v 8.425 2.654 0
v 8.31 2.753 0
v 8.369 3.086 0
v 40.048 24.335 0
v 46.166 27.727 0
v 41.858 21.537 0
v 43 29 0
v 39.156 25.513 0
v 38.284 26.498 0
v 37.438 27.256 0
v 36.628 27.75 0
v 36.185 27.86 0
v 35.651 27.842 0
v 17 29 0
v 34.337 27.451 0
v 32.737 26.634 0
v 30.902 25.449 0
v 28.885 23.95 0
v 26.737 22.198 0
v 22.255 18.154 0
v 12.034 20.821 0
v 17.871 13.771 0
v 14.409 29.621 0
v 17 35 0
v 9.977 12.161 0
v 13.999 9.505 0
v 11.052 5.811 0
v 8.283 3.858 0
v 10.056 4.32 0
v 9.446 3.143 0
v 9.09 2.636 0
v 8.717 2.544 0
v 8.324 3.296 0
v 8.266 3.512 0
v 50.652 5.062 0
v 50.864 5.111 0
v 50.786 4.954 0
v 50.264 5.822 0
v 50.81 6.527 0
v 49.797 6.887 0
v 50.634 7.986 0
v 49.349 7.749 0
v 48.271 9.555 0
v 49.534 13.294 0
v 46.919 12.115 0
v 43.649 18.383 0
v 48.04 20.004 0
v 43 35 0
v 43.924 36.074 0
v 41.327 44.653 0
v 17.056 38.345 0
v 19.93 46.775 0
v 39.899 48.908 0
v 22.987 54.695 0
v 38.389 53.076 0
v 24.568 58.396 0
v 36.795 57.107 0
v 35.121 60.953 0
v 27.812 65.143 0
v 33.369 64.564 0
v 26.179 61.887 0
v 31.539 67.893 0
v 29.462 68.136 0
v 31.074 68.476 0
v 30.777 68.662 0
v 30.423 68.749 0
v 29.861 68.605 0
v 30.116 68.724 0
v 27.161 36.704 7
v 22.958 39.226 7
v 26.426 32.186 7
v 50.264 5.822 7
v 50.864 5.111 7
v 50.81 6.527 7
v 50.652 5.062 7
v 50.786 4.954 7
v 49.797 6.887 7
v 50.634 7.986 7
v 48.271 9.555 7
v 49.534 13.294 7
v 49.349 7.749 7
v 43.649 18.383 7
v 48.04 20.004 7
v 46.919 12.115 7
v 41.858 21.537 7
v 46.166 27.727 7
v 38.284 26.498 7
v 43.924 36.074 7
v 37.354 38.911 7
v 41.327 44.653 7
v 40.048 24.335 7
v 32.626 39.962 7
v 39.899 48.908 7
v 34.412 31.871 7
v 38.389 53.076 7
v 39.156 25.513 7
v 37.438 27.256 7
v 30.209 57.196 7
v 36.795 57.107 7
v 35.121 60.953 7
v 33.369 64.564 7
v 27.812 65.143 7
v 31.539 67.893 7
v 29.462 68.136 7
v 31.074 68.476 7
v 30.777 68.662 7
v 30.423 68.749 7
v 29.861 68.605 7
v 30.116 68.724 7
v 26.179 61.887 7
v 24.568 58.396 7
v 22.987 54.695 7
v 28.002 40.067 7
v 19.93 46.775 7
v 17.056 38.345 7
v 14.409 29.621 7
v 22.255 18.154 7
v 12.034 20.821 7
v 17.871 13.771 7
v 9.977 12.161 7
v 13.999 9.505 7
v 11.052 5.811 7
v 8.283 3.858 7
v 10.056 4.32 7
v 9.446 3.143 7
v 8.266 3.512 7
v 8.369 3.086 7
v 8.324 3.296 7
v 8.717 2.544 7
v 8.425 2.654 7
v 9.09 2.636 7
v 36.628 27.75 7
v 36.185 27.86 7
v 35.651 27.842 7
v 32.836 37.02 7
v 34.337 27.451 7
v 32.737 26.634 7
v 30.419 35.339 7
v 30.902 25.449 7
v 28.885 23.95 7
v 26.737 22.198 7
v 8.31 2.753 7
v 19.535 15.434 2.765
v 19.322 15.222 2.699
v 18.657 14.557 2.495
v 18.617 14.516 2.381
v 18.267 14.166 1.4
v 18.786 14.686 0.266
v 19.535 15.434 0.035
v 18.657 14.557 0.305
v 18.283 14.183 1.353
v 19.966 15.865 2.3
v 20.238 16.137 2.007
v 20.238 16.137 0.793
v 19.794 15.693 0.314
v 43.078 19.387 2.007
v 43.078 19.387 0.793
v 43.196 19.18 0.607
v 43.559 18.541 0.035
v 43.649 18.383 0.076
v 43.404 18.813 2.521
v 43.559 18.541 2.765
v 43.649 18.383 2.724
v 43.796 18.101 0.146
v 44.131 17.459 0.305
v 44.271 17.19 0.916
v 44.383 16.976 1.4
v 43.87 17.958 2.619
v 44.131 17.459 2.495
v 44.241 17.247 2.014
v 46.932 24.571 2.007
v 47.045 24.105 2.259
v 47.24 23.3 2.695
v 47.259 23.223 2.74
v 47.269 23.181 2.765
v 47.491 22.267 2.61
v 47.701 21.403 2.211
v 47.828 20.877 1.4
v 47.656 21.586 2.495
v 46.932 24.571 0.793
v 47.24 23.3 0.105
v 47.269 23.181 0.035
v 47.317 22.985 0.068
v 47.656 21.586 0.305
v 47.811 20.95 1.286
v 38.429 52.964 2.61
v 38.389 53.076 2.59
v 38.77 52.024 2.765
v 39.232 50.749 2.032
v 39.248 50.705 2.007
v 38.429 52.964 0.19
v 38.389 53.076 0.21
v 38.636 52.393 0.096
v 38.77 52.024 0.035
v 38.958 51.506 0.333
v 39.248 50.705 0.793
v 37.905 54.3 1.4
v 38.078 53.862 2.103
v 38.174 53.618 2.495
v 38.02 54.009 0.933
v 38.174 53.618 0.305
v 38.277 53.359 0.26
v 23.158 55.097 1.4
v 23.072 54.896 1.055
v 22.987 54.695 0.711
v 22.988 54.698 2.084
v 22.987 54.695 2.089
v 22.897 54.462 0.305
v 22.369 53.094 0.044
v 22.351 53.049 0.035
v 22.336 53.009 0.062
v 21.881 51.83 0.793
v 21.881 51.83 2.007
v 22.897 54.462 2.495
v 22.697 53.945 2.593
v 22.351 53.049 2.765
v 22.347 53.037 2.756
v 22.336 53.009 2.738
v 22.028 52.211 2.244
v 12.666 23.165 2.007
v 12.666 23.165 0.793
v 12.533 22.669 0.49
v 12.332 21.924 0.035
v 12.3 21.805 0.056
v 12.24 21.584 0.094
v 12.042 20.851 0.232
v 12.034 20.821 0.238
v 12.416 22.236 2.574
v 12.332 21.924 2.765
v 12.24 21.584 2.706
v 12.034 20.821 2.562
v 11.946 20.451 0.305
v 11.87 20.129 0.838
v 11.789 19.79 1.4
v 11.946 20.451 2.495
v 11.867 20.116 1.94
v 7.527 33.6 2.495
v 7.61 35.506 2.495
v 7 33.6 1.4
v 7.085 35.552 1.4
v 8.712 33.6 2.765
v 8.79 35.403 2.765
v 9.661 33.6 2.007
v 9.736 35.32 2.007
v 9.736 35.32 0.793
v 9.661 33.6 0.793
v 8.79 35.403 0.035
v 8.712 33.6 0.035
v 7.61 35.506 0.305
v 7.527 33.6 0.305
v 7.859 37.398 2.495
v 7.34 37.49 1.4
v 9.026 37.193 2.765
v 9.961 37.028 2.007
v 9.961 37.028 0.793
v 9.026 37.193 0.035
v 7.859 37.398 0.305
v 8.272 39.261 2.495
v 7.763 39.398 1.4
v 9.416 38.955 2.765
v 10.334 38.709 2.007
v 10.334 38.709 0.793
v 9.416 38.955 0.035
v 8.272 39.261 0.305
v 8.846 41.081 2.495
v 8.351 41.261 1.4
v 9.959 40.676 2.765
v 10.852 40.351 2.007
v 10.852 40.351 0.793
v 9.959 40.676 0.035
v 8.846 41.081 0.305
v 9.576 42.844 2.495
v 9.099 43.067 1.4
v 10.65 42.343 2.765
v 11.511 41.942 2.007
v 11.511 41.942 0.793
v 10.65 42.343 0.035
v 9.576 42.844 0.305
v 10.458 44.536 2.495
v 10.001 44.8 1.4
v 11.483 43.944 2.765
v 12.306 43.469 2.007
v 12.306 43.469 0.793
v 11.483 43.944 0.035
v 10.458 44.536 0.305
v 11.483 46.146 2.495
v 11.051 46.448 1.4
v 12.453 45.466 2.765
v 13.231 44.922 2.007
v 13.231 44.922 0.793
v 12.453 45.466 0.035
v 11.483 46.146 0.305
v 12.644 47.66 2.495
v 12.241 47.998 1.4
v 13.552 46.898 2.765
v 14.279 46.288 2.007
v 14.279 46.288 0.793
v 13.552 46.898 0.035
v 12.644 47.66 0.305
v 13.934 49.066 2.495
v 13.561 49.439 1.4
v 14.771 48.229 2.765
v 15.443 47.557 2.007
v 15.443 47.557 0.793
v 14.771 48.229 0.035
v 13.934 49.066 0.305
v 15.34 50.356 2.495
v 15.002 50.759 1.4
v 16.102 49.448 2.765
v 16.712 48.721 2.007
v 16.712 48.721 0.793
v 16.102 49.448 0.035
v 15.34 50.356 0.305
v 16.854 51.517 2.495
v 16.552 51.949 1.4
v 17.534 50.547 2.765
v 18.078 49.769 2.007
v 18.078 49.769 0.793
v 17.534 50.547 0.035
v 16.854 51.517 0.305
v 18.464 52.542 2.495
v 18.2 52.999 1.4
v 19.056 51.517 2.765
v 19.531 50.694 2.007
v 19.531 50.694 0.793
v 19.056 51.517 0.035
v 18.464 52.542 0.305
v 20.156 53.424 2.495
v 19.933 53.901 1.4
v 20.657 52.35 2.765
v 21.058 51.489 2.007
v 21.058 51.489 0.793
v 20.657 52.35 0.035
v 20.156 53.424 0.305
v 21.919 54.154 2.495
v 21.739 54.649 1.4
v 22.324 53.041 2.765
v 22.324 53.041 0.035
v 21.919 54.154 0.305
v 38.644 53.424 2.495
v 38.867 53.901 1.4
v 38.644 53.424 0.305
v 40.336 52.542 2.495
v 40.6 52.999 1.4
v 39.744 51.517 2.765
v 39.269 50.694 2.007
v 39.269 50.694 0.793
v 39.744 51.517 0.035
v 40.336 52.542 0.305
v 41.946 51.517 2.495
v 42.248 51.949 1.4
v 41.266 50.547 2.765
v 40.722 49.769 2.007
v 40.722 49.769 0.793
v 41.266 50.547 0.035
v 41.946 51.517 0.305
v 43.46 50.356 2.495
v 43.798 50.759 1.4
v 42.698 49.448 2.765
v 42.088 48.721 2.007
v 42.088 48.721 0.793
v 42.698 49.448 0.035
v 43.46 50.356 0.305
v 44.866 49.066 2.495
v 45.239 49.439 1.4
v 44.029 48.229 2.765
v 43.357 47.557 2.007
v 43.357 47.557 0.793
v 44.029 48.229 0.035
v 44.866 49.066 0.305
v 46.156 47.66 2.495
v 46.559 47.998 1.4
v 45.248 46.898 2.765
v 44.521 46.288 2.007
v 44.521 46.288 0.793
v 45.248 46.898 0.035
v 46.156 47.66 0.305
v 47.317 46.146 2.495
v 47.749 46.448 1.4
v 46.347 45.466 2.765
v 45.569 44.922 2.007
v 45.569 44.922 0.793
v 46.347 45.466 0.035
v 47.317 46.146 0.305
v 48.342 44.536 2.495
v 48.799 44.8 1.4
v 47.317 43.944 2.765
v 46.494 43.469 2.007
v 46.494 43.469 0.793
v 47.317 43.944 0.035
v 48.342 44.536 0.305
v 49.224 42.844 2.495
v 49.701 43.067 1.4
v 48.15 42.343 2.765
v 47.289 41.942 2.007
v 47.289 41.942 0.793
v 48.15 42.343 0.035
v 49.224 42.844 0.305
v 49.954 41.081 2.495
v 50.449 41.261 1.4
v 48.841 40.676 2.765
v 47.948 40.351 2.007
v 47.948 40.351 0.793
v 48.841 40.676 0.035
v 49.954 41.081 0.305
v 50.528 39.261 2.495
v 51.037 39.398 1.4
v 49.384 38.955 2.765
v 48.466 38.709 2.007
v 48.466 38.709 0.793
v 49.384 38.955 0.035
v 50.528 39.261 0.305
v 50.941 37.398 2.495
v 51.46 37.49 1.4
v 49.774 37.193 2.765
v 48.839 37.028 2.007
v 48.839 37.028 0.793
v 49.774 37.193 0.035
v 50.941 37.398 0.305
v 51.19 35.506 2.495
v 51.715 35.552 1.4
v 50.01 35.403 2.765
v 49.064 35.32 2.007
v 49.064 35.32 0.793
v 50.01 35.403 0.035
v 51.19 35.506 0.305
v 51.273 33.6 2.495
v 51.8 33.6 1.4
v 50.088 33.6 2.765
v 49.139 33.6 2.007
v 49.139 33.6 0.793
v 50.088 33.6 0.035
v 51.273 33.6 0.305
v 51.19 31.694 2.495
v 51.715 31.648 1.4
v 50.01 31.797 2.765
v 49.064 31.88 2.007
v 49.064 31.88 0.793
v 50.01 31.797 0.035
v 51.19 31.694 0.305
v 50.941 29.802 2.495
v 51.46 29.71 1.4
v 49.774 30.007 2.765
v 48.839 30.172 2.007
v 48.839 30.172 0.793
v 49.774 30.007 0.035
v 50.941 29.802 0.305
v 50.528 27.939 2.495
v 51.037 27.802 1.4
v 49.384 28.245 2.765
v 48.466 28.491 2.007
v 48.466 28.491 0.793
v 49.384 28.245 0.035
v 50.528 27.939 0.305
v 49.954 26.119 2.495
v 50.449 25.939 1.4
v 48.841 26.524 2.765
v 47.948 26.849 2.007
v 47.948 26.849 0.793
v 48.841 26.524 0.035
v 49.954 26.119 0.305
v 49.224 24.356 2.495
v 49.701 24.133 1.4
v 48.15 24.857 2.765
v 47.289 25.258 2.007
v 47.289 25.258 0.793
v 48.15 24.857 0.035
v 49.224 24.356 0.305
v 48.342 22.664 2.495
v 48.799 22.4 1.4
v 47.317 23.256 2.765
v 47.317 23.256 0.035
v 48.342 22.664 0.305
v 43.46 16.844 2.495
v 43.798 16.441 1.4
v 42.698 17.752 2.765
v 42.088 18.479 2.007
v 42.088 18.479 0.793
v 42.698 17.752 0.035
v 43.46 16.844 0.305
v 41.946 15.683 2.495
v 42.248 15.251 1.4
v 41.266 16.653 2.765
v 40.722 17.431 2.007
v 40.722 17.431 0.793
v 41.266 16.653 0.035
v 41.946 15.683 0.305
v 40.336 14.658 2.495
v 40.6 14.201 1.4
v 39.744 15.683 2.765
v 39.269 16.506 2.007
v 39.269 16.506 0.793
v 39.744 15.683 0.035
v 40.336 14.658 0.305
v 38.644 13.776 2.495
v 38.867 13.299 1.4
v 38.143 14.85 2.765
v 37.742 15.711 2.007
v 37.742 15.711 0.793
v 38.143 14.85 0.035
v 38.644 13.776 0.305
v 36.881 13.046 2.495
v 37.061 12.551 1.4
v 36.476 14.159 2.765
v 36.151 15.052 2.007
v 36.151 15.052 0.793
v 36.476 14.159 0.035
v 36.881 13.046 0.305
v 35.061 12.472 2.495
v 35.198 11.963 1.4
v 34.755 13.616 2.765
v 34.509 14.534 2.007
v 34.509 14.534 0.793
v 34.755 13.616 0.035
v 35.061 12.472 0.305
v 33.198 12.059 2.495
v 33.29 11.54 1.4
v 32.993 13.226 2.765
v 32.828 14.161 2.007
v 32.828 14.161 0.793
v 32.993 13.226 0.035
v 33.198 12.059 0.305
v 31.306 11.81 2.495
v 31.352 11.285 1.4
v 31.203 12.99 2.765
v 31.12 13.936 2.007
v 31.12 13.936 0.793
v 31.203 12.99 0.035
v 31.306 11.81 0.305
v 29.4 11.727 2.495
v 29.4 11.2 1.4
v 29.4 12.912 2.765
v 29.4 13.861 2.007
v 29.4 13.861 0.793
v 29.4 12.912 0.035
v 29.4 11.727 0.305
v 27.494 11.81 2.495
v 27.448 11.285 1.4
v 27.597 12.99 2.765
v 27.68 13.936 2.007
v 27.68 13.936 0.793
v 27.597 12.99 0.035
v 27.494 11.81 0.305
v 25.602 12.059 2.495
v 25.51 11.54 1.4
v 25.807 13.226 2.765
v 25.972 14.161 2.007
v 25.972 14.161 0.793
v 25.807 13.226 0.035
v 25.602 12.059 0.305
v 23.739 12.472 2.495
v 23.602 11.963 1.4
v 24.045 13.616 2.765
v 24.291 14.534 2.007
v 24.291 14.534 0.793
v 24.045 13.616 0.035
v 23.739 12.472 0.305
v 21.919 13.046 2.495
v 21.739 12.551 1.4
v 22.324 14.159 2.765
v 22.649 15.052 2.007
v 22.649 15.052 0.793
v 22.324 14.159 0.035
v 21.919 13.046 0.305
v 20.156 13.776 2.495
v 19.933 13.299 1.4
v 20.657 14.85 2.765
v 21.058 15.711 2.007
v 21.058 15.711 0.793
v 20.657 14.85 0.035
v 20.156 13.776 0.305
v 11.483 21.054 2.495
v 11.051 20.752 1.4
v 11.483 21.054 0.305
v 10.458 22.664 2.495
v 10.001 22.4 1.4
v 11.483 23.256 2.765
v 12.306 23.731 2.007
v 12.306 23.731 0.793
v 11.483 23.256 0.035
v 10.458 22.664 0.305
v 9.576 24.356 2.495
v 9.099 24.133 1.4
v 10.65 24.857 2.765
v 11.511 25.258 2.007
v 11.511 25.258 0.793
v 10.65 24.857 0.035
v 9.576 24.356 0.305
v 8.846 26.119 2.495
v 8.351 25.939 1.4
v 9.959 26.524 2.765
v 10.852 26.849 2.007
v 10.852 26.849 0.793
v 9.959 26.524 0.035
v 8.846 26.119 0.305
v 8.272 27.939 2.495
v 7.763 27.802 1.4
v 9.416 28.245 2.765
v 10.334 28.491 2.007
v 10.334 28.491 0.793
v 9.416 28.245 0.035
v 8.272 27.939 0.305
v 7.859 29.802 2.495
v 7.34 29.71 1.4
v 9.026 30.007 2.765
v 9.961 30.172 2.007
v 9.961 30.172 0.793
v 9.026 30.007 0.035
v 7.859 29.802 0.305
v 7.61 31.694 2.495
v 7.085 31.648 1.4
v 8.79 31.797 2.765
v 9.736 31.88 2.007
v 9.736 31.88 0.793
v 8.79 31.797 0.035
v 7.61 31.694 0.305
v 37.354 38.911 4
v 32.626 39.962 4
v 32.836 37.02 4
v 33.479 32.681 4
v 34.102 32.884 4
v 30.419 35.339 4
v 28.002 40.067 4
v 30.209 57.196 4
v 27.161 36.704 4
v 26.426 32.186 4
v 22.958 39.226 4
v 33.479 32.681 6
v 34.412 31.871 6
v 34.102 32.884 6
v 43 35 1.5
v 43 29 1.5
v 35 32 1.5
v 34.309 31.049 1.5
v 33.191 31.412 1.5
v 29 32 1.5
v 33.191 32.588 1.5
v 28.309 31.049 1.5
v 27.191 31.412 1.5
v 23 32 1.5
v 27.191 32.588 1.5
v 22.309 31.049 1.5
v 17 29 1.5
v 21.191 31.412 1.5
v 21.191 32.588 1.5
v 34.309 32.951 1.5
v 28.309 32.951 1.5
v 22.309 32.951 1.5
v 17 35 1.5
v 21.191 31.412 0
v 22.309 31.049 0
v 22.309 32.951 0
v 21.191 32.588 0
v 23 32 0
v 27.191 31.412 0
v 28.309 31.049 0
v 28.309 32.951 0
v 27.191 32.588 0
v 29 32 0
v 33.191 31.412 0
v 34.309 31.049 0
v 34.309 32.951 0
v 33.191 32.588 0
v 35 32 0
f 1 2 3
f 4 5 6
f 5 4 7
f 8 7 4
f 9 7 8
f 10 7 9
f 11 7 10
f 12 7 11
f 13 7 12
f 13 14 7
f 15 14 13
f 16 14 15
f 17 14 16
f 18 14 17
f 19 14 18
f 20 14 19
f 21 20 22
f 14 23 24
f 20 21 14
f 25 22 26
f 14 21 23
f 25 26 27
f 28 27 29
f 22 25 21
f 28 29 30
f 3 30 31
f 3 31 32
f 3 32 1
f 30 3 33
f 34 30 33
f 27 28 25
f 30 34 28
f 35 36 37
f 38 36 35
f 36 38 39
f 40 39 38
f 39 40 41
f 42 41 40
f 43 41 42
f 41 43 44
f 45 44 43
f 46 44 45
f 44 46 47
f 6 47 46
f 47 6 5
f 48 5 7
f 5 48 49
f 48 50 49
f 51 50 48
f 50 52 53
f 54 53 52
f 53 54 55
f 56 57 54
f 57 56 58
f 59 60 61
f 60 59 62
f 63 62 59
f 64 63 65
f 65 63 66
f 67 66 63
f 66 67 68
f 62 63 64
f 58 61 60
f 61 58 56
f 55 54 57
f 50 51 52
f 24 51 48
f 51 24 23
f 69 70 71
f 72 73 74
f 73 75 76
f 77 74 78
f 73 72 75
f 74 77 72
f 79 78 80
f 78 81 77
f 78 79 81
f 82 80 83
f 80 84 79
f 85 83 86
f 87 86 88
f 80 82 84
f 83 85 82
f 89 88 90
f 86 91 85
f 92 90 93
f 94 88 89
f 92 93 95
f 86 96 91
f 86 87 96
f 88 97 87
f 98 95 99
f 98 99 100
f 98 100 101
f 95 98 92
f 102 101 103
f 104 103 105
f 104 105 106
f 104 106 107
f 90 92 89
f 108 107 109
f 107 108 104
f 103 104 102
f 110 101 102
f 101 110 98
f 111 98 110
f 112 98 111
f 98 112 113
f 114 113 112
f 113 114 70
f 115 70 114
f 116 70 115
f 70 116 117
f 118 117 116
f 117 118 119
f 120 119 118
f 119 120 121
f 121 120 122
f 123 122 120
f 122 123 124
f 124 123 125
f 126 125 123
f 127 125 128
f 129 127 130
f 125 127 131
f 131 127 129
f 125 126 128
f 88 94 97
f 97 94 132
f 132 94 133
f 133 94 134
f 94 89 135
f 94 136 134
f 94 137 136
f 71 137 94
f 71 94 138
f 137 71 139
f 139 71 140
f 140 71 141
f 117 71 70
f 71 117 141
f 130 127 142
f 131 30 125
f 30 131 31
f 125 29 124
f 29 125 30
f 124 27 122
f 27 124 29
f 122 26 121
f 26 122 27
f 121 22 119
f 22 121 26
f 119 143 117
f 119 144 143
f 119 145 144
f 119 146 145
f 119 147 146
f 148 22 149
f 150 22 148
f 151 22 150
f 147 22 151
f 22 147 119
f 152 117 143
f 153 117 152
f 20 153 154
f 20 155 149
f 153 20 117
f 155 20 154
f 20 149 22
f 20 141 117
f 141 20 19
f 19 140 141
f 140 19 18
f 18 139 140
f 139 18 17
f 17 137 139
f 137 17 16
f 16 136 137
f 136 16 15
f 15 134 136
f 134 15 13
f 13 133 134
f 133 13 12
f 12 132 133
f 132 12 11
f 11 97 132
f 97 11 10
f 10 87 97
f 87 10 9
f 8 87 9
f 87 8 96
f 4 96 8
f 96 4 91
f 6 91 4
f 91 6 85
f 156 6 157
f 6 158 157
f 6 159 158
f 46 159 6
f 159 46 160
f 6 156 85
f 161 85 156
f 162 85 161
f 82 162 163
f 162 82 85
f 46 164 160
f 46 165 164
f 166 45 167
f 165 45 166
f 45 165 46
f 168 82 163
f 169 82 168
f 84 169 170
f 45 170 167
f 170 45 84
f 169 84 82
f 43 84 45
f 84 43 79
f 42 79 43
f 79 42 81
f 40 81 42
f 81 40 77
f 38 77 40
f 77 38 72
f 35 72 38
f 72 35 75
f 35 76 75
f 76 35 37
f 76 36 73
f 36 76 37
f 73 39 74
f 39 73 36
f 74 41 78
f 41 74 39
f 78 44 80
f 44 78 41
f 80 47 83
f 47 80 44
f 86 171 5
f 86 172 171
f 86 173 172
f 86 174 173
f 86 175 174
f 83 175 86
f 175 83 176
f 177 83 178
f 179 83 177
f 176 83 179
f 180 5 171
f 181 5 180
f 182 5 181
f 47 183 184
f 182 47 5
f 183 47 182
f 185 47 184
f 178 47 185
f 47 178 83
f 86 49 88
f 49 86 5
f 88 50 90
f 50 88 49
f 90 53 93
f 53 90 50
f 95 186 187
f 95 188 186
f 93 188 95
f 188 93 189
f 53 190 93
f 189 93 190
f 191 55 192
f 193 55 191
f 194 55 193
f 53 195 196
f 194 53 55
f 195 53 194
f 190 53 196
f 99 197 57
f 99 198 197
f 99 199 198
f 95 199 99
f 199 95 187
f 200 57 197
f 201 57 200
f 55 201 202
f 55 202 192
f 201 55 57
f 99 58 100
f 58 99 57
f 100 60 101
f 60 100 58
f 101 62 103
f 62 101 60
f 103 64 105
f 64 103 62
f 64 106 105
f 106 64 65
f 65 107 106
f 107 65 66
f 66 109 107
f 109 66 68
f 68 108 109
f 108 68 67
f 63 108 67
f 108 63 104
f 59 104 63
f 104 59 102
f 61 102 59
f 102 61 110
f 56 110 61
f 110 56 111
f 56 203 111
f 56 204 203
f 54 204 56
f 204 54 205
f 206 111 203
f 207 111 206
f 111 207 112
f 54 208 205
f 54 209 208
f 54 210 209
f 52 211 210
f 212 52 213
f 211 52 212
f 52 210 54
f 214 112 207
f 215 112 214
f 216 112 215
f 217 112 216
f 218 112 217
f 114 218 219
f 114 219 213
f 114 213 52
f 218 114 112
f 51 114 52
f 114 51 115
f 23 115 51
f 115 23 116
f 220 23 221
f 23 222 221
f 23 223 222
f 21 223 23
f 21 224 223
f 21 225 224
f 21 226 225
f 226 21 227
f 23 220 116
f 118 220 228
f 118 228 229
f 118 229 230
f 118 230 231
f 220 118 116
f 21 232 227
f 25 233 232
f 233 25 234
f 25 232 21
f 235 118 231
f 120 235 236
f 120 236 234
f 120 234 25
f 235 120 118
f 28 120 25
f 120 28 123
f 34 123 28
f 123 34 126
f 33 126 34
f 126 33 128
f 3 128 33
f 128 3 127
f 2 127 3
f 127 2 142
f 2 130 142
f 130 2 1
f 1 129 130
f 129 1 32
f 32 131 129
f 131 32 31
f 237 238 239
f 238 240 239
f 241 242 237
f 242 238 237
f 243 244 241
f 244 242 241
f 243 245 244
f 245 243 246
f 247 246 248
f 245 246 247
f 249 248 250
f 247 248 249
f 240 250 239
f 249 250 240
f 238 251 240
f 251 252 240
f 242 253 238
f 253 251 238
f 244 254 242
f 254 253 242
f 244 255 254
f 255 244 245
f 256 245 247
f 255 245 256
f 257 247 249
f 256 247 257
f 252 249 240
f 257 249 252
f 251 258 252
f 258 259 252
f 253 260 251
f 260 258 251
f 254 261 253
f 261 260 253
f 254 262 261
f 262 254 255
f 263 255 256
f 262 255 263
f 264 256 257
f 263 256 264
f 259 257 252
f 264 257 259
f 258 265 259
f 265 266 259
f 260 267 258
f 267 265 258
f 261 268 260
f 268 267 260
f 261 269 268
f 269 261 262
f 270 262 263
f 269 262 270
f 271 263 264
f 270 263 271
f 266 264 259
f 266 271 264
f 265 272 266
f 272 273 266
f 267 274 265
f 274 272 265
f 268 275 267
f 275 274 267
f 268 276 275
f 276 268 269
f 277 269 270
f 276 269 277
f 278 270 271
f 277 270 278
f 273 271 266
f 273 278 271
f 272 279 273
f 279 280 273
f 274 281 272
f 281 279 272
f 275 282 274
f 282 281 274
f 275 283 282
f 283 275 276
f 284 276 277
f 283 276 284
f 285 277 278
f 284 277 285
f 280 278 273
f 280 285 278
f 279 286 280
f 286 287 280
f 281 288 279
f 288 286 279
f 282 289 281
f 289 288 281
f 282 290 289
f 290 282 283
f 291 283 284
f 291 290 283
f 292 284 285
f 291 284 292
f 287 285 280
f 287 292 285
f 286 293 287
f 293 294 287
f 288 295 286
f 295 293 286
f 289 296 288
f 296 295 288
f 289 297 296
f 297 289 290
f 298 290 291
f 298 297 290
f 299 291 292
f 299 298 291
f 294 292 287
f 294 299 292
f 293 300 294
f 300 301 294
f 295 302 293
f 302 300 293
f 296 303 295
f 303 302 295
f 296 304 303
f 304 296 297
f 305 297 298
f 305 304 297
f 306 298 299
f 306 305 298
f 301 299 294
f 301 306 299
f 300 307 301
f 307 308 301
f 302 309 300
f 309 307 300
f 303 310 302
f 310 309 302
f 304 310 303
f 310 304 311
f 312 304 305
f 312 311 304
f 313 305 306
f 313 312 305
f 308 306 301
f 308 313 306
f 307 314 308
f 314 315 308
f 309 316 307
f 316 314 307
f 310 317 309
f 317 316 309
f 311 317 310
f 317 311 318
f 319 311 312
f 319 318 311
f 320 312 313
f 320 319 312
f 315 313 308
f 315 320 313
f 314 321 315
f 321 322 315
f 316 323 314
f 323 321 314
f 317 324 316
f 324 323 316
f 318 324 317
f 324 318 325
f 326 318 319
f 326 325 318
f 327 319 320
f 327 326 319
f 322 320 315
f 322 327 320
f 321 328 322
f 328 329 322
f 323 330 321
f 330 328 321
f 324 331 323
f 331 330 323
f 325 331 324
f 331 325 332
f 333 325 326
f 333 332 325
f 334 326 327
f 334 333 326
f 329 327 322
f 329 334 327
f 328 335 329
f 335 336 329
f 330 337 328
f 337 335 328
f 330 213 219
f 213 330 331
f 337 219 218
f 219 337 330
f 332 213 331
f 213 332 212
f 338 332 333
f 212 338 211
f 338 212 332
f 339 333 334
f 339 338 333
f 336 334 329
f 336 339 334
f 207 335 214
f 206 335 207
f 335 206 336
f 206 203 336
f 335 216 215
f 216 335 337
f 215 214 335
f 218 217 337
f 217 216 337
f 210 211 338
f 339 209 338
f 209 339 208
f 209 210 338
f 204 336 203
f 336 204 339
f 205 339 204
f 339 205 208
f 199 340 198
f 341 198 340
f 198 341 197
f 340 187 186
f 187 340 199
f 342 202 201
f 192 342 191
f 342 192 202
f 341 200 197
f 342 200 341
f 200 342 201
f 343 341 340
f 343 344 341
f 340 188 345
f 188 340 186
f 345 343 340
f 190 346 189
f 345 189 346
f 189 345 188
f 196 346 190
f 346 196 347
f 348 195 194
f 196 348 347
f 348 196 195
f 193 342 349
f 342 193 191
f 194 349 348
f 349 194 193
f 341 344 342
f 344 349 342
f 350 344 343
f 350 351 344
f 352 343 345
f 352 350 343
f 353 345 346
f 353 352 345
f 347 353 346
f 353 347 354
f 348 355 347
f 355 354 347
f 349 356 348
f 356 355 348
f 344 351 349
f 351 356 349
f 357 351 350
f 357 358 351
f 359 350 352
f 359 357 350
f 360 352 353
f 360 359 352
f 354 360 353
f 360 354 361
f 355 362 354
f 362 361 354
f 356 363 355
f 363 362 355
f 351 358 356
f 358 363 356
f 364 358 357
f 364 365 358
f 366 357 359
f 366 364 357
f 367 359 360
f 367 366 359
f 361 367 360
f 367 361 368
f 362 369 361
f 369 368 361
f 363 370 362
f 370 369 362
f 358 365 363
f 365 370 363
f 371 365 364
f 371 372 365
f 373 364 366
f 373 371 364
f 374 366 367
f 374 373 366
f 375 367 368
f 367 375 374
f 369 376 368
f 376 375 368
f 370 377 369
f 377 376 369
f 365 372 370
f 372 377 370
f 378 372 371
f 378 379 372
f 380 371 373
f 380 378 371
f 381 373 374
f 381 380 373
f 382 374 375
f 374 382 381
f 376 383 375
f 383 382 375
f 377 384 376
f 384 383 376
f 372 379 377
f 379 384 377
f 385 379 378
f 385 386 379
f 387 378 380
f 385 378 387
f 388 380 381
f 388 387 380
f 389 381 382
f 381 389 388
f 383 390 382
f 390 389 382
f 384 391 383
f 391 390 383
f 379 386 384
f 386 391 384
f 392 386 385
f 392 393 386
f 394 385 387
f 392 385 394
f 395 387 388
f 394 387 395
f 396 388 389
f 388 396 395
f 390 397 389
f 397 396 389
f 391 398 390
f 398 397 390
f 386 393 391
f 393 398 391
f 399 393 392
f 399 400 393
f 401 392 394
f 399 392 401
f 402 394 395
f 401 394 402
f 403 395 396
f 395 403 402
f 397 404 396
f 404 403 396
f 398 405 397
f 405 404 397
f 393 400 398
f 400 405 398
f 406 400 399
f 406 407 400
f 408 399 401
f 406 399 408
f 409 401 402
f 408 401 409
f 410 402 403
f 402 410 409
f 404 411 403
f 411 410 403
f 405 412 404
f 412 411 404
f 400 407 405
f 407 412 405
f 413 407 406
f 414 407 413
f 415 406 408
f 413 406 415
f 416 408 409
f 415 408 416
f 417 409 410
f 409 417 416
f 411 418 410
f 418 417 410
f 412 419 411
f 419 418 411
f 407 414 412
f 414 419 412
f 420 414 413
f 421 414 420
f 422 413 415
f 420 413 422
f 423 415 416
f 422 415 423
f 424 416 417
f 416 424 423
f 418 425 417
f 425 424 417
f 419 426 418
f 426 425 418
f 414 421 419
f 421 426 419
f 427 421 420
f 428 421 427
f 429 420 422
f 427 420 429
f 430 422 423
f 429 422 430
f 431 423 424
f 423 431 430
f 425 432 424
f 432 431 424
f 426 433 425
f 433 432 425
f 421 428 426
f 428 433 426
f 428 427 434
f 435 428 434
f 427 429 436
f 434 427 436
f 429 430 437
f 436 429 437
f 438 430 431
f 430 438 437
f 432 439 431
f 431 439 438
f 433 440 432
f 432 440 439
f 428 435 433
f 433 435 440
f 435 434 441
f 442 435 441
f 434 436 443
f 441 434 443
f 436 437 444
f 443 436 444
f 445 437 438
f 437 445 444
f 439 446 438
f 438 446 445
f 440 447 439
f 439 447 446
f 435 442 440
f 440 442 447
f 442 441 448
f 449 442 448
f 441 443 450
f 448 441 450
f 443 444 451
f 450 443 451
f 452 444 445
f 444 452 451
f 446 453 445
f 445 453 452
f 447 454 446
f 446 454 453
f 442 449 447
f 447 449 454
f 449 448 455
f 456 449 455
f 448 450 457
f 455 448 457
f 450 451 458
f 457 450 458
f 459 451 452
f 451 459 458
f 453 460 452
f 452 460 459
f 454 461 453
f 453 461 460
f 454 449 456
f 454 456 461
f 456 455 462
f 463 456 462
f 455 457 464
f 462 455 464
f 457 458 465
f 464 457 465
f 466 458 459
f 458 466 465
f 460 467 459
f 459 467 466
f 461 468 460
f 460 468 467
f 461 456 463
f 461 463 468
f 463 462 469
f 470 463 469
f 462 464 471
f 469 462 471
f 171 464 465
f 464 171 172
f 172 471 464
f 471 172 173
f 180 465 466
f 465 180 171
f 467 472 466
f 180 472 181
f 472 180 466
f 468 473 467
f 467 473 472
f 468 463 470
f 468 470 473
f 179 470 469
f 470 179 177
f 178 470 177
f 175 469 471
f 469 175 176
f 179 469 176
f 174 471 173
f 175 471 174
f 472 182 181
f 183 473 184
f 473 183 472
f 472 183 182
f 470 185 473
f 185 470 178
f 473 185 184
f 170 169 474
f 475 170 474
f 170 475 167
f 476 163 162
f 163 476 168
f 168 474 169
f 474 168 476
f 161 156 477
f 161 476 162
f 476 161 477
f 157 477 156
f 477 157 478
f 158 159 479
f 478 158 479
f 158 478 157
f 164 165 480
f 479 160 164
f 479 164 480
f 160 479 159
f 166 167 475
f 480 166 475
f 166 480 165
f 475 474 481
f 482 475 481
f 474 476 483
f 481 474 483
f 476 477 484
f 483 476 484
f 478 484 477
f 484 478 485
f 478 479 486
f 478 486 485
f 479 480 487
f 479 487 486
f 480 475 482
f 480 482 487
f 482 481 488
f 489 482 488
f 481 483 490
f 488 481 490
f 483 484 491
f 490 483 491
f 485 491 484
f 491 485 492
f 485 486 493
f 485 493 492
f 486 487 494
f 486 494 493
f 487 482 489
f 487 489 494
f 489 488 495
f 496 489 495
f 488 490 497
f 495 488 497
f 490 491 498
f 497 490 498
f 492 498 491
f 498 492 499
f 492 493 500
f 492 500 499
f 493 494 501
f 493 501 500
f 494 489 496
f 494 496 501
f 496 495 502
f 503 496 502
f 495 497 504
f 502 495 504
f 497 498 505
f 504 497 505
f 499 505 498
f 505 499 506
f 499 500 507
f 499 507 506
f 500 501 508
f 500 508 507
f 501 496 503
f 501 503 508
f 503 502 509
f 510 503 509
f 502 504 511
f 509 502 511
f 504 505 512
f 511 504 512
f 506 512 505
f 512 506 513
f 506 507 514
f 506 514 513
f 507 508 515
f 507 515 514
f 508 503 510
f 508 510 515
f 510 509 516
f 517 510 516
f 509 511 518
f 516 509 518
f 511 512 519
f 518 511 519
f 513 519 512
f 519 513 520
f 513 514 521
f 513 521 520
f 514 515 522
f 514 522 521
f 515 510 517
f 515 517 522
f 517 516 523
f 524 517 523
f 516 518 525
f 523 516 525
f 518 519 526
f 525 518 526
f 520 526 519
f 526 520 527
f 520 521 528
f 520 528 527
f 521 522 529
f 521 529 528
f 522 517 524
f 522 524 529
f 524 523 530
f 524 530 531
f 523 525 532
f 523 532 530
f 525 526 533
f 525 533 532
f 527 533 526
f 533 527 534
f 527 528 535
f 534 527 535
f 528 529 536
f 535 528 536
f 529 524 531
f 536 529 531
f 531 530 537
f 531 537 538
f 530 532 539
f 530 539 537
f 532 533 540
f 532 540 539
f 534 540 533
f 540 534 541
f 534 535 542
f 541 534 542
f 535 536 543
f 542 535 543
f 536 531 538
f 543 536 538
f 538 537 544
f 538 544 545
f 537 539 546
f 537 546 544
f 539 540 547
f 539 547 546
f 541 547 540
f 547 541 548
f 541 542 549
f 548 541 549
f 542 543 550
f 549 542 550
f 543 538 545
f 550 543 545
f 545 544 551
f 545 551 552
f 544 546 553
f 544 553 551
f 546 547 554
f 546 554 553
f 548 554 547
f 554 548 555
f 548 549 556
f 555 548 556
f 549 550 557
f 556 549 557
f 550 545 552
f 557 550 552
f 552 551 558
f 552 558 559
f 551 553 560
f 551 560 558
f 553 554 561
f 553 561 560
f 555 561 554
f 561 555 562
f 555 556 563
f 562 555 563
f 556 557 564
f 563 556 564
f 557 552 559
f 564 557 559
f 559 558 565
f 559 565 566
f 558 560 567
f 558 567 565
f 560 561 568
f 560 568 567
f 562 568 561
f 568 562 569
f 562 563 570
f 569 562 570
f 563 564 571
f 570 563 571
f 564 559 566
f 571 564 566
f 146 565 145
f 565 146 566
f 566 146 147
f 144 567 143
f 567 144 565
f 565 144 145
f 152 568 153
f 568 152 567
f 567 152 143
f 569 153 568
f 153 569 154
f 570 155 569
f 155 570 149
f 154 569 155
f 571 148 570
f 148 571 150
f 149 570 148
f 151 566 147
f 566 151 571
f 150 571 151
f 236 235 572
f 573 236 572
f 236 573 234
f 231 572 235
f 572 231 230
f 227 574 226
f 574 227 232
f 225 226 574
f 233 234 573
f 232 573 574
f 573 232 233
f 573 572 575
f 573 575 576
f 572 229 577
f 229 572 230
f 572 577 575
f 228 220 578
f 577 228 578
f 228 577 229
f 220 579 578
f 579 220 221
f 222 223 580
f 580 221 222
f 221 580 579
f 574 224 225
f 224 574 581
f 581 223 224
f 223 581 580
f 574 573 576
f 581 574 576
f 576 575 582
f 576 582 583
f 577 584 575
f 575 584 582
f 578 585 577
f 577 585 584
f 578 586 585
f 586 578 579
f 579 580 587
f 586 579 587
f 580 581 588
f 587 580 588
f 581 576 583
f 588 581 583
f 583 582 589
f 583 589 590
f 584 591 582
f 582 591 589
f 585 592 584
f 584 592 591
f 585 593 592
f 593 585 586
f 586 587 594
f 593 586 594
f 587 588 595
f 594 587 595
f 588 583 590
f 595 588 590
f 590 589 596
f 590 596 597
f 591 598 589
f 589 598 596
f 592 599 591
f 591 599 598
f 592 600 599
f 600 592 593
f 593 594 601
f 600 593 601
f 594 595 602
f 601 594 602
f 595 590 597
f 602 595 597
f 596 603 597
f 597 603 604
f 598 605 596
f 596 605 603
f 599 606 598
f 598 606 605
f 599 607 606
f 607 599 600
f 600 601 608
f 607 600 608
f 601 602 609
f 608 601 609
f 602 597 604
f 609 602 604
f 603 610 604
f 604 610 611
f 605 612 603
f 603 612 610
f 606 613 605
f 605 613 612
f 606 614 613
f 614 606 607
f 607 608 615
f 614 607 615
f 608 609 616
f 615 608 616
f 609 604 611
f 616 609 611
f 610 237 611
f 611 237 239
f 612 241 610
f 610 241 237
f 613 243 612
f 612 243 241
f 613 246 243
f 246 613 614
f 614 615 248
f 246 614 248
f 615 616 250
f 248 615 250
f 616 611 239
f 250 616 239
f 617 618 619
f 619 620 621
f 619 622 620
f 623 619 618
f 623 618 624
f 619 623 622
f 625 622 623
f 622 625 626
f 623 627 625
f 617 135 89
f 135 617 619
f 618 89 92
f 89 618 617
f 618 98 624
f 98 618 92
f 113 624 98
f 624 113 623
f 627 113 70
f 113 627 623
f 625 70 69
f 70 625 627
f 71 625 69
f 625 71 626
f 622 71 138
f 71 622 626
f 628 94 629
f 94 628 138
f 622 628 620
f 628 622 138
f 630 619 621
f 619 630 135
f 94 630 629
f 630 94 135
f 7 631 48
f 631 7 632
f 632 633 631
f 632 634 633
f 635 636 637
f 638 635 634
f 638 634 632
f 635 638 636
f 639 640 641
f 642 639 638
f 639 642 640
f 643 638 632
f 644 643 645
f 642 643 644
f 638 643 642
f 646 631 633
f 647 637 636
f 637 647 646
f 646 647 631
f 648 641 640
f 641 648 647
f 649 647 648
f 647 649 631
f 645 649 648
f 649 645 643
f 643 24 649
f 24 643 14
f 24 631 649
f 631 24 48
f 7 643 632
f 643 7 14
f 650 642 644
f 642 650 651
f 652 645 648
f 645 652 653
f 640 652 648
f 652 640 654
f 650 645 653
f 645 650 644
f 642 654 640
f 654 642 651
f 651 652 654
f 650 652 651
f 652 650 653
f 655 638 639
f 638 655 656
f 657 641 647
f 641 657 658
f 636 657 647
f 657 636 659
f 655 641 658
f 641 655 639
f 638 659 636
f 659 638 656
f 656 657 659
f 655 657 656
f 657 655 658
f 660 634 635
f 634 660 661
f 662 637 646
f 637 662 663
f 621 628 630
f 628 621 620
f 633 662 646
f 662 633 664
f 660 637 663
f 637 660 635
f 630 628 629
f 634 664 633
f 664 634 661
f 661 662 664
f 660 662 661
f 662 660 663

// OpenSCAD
$fa=5;
include_symbol="TSTAR"; // CIRCLE,TSTAR, LEAF

module curve_cut()
{
  difference()
  {
    cylinder(r=215,h=200);
    translate([0,0,-1]) cylinder(r=200,h=215);
  }
}

module symbol_circle()
{
  cylinder(r=7, h=20);
}
module symbol_tstar()
{
  scale([.7,.7,.7])
  {
    translate([-43.5,-58,0]) linear_extrude(height=10)
    {
      import("Startrek.dxf","Layer 2");
    }
  }
}
module symbol_leaf()
{
  scale([.7,.7,.7])
  {
    translate([-43.5,-58,0]) linear_extrude(height=10)
    {
      import("Startrek.dxf","Layer 3");
    }
  }
}
module badge()
{
  scale([.7,.7,.7])
  {
    linear_extrude(height=10)
    {
      import("Startrek.dxf","Layer 1");
    }
    translate([42,48,2]) rotate_extrude()
    {
      translate([30,0,0]) circle(r=2);
    }
  }
}
module symbol()
{
  if(include_symbol=="CIRCLE") symbol_circle();
  if(include_symbol=="TSTAR") symbol_tstar();
  if(include_symbol=="LEAF") symbol_leaf();
}
scale([1, 1, 1])
{
  difference()
  {
    badge();
//    translate([0,45,-190]) rotate([0,90,0]) curve_cut();
    translate([30.5,40,4]) symbol();
    translate([30,32,-0]) cube([26,6,3],center=true);
  }
  translate([22,32,0]) cylinder(r=1,h=6);
  translate([28,32,0]) cylinder(r=1,h=6);
  translate([34,32,0]) cylinder(r=1,h=6);
}
